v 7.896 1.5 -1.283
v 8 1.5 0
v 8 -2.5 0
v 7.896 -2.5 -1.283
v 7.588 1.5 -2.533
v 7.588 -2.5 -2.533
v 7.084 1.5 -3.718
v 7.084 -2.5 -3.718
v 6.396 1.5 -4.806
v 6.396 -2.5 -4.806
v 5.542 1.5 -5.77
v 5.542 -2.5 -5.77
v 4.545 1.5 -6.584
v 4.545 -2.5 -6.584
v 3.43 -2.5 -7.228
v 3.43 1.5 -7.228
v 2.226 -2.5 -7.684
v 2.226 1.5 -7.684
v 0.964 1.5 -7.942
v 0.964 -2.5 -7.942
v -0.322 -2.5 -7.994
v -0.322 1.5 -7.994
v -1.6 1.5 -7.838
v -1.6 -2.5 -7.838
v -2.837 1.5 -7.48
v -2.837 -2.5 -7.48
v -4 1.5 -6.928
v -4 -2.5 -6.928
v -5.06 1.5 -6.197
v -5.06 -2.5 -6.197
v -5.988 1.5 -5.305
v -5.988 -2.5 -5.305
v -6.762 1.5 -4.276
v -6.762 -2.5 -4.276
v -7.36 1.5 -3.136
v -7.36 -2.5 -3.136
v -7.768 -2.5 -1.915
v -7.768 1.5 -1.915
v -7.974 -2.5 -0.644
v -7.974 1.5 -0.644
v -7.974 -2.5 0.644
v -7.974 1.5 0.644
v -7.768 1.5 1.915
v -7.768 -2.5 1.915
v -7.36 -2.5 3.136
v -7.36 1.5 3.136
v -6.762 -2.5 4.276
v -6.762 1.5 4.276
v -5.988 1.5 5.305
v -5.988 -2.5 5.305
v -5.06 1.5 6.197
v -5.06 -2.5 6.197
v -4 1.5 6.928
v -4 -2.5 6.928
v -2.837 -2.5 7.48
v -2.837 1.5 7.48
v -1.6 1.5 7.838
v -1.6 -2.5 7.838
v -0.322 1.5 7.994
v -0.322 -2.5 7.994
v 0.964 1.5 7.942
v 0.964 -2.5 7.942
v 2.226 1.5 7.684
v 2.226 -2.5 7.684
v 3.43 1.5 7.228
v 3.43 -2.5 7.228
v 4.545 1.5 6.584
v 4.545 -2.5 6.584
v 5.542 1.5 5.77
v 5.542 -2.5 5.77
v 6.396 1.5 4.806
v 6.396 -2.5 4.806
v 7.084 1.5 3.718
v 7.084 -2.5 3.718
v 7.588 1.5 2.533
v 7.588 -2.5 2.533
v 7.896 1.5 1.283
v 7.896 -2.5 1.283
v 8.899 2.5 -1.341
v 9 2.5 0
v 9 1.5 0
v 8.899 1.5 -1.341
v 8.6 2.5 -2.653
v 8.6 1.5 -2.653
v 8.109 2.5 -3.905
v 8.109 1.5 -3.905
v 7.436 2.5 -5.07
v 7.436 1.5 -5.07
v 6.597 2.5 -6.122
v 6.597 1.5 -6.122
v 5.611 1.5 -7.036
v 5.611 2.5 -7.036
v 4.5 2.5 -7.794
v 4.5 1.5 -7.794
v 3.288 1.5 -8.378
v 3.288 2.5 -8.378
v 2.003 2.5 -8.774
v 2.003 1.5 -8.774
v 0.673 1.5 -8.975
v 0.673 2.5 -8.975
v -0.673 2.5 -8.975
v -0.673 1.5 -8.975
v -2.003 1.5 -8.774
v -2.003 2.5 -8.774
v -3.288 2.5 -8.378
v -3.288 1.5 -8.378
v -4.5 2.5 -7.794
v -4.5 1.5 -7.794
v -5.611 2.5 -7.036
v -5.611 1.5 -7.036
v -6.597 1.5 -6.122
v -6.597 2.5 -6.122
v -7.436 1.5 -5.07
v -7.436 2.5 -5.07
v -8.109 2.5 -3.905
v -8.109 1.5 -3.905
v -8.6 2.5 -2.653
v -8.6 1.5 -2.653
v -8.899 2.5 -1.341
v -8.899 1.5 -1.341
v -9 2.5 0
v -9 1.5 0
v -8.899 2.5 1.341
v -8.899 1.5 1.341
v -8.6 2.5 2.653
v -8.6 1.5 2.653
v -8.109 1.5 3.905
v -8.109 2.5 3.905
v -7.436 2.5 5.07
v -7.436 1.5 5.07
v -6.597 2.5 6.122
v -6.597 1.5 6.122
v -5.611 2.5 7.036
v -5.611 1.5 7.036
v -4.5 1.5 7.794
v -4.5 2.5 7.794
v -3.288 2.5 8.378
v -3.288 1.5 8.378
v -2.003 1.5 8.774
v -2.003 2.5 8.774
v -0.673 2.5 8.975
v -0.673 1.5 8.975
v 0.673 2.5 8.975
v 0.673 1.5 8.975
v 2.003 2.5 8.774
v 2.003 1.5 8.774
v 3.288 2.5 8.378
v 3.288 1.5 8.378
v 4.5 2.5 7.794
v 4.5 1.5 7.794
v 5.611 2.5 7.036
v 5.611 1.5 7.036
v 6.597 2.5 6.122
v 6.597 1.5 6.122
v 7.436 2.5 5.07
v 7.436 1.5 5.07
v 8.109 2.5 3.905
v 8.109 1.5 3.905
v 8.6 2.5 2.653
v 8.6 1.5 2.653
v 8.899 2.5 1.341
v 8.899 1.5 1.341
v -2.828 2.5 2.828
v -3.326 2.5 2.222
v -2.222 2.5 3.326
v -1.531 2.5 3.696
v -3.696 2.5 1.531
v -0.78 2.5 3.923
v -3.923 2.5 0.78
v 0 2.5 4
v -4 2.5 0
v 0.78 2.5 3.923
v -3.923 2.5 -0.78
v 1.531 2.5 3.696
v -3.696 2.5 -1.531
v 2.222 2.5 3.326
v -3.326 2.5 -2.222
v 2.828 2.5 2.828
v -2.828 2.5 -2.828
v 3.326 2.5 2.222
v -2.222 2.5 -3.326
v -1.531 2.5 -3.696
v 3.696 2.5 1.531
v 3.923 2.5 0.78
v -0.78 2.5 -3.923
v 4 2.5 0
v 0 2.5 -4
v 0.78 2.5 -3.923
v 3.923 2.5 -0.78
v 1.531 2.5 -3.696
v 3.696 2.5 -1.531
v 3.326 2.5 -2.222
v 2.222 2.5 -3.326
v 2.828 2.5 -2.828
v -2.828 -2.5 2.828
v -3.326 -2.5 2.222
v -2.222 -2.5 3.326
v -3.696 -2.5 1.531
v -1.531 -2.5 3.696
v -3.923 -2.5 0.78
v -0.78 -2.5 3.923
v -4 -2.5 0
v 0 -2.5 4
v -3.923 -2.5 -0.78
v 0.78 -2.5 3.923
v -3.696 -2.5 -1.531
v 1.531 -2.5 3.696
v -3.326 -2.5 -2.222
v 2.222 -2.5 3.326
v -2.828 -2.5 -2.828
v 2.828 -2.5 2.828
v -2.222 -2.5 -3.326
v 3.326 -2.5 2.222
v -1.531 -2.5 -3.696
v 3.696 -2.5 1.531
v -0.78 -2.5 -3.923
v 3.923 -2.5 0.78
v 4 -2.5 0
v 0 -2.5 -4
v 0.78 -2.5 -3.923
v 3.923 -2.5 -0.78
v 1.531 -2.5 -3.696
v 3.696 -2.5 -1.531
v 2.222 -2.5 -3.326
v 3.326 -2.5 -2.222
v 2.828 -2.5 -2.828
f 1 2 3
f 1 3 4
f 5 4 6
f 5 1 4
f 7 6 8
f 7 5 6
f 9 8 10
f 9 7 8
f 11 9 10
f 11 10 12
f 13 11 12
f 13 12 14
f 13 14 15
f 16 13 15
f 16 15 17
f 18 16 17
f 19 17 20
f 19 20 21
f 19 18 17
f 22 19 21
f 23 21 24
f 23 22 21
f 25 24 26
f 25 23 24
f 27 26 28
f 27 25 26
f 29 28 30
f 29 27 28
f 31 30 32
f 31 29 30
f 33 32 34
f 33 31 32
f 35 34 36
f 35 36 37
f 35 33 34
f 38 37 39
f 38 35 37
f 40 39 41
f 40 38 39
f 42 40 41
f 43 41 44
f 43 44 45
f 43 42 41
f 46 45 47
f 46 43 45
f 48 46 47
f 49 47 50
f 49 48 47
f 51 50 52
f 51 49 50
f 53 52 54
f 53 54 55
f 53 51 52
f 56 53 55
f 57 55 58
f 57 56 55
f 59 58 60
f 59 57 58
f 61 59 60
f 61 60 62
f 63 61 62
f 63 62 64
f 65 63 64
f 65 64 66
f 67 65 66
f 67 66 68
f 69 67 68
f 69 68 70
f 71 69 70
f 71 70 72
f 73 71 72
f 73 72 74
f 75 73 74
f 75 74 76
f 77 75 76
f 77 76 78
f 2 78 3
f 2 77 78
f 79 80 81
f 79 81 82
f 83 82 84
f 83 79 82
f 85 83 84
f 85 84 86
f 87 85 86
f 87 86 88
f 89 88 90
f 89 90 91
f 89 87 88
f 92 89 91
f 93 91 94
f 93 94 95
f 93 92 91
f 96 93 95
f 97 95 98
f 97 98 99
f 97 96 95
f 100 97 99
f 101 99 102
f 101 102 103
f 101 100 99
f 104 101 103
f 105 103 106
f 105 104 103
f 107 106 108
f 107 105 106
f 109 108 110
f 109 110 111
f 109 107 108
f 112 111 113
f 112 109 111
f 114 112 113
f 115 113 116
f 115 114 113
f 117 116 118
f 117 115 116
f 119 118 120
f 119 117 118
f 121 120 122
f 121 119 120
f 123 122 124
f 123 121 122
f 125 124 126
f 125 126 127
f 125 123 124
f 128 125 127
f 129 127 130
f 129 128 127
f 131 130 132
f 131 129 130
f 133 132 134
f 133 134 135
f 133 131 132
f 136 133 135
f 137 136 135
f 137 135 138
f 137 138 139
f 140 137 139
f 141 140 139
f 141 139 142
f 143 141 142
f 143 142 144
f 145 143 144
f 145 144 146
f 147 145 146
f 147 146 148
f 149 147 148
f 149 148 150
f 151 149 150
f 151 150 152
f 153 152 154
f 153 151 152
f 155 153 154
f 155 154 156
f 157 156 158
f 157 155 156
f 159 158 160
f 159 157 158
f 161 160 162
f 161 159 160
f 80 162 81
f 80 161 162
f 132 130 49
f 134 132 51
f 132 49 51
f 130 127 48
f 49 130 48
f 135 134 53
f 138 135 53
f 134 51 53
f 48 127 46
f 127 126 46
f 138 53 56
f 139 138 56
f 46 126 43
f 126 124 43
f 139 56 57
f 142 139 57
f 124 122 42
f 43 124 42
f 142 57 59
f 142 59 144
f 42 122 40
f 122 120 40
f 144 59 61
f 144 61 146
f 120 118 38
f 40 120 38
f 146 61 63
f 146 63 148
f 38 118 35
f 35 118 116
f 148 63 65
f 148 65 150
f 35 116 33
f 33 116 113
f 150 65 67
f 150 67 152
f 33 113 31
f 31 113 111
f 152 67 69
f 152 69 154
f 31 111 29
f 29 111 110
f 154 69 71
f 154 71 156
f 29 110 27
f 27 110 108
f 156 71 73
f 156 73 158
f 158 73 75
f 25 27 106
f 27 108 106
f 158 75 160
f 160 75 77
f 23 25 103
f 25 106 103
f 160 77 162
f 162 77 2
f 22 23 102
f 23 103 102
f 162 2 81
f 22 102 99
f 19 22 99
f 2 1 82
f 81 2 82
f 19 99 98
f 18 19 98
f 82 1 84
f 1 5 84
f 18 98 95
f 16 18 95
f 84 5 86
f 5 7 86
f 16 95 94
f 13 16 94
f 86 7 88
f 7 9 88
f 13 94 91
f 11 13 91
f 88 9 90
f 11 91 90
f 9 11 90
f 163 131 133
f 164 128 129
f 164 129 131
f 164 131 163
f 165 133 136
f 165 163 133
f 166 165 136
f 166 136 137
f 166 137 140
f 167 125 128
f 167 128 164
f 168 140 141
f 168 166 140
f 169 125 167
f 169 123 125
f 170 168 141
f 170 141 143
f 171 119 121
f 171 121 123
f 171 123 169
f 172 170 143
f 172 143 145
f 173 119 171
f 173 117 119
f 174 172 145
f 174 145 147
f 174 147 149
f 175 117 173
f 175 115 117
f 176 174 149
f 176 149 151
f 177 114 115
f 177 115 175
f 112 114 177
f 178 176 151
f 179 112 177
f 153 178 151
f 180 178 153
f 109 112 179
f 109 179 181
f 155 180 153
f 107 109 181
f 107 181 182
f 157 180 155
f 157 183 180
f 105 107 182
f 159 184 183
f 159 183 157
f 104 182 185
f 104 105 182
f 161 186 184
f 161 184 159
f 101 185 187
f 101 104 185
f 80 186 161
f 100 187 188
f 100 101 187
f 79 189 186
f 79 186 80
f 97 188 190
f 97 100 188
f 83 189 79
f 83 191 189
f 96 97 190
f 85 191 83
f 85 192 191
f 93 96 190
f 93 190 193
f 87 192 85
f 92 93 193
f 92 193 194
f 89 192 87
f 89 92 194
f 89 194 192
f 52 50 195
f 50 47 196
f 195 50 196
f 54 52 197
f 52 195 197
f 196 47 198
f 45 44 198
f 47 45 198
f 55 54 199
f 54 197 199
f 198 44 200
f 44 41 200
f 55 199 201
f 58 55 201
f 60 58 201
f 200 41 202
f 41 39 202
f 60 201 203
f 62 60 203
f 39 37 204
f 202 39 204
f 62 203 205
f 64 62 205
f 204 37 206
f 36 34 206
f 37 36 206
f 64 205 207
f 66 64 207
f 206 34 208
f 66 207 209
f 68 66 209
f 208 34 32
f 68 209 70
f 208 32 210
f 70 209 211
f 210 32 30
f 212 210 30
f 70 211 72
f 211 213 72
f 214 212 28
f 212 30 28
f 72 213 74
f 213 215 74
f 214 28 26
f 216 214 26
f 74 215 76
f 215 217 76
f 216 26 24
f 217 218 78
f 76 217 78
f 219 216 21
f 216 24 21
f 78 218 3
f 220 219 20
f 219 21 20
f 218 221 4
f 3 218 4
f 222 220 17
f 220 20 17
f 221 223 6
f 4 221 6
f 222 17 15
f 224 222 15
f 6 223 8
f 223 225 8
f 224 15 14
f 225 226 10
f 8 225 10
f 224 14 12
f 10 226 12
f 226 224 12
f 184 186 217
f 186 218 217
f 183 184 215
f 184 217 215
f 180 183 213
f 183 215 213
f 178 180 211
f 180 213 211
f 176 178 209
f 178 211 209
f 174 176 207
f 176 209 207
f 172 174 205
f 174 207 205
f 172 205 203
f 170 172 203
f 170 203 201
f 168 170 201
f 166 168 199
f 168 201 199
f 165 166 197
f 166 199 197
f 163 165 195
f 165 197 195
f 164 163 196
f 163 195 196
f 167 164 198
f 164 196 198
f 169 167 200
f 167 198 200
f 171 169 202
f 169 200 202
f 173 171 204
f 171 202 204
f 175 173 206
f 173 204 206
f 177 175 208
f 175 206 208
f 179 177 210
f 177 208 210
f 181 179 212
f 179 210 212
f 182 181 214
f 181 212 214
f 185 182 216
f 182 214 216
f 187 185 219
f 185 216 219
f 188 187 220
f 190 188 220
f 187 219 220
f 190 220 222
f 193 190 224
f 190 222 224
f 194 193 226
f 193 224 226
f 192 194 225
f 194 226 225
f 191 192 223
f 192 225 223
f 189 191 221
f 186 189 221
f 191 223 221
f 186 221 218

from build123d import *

# Parameters (mm, degrees)
SKETCH2_R           = 8
SKETCH2_R_2         = 4
BOSS_EXTRUDE1_DEPTH = 2.5
SKETCH3_R           = 9
BOSS_EXTRUDE3_DEPTH = 1
SKETCH5_R           = 4
CUT_EXTRUDE1_DEPTH  = 6


with BuildPart() as part:
    # Sketch2 → Boss-Extrude1 (new body, symmetric)
    with BuildSketch(Plane(origin=(0, 0, 0), x_dir=(1, 0, 0), z_dir=(0, 1, 0))):
        Circle(SKETCH2_R)
        Circle(SKETCH2_R_2, mode=Mode.SUBTRACT)
    extrude(amount=BOSS_EXTRUDE1_DEPTH, both=True)

    # Sketch3 → Boss-Extrude3 (add)
    with BuildSketch(Plane(origin=(0, 2.5, 0), x_dir=(1, 0, 0), z_dir=(0, 1, 0))):
        Circle(SKETCH3_R)
    extrude(amount=-BOSS_EXTRUDE3_DEPTH)

    # Sketch5 → Cut-Extrude1 (cut, through all)
    with BuildSketch(Plane.XZ.offset(2.5)):
        Circle(SKETCH5_R)
    extrude(amount=-CUT_EXTRUDE1_DEPTH, mode=Mode.SUBTRACT)


solid = part.part
